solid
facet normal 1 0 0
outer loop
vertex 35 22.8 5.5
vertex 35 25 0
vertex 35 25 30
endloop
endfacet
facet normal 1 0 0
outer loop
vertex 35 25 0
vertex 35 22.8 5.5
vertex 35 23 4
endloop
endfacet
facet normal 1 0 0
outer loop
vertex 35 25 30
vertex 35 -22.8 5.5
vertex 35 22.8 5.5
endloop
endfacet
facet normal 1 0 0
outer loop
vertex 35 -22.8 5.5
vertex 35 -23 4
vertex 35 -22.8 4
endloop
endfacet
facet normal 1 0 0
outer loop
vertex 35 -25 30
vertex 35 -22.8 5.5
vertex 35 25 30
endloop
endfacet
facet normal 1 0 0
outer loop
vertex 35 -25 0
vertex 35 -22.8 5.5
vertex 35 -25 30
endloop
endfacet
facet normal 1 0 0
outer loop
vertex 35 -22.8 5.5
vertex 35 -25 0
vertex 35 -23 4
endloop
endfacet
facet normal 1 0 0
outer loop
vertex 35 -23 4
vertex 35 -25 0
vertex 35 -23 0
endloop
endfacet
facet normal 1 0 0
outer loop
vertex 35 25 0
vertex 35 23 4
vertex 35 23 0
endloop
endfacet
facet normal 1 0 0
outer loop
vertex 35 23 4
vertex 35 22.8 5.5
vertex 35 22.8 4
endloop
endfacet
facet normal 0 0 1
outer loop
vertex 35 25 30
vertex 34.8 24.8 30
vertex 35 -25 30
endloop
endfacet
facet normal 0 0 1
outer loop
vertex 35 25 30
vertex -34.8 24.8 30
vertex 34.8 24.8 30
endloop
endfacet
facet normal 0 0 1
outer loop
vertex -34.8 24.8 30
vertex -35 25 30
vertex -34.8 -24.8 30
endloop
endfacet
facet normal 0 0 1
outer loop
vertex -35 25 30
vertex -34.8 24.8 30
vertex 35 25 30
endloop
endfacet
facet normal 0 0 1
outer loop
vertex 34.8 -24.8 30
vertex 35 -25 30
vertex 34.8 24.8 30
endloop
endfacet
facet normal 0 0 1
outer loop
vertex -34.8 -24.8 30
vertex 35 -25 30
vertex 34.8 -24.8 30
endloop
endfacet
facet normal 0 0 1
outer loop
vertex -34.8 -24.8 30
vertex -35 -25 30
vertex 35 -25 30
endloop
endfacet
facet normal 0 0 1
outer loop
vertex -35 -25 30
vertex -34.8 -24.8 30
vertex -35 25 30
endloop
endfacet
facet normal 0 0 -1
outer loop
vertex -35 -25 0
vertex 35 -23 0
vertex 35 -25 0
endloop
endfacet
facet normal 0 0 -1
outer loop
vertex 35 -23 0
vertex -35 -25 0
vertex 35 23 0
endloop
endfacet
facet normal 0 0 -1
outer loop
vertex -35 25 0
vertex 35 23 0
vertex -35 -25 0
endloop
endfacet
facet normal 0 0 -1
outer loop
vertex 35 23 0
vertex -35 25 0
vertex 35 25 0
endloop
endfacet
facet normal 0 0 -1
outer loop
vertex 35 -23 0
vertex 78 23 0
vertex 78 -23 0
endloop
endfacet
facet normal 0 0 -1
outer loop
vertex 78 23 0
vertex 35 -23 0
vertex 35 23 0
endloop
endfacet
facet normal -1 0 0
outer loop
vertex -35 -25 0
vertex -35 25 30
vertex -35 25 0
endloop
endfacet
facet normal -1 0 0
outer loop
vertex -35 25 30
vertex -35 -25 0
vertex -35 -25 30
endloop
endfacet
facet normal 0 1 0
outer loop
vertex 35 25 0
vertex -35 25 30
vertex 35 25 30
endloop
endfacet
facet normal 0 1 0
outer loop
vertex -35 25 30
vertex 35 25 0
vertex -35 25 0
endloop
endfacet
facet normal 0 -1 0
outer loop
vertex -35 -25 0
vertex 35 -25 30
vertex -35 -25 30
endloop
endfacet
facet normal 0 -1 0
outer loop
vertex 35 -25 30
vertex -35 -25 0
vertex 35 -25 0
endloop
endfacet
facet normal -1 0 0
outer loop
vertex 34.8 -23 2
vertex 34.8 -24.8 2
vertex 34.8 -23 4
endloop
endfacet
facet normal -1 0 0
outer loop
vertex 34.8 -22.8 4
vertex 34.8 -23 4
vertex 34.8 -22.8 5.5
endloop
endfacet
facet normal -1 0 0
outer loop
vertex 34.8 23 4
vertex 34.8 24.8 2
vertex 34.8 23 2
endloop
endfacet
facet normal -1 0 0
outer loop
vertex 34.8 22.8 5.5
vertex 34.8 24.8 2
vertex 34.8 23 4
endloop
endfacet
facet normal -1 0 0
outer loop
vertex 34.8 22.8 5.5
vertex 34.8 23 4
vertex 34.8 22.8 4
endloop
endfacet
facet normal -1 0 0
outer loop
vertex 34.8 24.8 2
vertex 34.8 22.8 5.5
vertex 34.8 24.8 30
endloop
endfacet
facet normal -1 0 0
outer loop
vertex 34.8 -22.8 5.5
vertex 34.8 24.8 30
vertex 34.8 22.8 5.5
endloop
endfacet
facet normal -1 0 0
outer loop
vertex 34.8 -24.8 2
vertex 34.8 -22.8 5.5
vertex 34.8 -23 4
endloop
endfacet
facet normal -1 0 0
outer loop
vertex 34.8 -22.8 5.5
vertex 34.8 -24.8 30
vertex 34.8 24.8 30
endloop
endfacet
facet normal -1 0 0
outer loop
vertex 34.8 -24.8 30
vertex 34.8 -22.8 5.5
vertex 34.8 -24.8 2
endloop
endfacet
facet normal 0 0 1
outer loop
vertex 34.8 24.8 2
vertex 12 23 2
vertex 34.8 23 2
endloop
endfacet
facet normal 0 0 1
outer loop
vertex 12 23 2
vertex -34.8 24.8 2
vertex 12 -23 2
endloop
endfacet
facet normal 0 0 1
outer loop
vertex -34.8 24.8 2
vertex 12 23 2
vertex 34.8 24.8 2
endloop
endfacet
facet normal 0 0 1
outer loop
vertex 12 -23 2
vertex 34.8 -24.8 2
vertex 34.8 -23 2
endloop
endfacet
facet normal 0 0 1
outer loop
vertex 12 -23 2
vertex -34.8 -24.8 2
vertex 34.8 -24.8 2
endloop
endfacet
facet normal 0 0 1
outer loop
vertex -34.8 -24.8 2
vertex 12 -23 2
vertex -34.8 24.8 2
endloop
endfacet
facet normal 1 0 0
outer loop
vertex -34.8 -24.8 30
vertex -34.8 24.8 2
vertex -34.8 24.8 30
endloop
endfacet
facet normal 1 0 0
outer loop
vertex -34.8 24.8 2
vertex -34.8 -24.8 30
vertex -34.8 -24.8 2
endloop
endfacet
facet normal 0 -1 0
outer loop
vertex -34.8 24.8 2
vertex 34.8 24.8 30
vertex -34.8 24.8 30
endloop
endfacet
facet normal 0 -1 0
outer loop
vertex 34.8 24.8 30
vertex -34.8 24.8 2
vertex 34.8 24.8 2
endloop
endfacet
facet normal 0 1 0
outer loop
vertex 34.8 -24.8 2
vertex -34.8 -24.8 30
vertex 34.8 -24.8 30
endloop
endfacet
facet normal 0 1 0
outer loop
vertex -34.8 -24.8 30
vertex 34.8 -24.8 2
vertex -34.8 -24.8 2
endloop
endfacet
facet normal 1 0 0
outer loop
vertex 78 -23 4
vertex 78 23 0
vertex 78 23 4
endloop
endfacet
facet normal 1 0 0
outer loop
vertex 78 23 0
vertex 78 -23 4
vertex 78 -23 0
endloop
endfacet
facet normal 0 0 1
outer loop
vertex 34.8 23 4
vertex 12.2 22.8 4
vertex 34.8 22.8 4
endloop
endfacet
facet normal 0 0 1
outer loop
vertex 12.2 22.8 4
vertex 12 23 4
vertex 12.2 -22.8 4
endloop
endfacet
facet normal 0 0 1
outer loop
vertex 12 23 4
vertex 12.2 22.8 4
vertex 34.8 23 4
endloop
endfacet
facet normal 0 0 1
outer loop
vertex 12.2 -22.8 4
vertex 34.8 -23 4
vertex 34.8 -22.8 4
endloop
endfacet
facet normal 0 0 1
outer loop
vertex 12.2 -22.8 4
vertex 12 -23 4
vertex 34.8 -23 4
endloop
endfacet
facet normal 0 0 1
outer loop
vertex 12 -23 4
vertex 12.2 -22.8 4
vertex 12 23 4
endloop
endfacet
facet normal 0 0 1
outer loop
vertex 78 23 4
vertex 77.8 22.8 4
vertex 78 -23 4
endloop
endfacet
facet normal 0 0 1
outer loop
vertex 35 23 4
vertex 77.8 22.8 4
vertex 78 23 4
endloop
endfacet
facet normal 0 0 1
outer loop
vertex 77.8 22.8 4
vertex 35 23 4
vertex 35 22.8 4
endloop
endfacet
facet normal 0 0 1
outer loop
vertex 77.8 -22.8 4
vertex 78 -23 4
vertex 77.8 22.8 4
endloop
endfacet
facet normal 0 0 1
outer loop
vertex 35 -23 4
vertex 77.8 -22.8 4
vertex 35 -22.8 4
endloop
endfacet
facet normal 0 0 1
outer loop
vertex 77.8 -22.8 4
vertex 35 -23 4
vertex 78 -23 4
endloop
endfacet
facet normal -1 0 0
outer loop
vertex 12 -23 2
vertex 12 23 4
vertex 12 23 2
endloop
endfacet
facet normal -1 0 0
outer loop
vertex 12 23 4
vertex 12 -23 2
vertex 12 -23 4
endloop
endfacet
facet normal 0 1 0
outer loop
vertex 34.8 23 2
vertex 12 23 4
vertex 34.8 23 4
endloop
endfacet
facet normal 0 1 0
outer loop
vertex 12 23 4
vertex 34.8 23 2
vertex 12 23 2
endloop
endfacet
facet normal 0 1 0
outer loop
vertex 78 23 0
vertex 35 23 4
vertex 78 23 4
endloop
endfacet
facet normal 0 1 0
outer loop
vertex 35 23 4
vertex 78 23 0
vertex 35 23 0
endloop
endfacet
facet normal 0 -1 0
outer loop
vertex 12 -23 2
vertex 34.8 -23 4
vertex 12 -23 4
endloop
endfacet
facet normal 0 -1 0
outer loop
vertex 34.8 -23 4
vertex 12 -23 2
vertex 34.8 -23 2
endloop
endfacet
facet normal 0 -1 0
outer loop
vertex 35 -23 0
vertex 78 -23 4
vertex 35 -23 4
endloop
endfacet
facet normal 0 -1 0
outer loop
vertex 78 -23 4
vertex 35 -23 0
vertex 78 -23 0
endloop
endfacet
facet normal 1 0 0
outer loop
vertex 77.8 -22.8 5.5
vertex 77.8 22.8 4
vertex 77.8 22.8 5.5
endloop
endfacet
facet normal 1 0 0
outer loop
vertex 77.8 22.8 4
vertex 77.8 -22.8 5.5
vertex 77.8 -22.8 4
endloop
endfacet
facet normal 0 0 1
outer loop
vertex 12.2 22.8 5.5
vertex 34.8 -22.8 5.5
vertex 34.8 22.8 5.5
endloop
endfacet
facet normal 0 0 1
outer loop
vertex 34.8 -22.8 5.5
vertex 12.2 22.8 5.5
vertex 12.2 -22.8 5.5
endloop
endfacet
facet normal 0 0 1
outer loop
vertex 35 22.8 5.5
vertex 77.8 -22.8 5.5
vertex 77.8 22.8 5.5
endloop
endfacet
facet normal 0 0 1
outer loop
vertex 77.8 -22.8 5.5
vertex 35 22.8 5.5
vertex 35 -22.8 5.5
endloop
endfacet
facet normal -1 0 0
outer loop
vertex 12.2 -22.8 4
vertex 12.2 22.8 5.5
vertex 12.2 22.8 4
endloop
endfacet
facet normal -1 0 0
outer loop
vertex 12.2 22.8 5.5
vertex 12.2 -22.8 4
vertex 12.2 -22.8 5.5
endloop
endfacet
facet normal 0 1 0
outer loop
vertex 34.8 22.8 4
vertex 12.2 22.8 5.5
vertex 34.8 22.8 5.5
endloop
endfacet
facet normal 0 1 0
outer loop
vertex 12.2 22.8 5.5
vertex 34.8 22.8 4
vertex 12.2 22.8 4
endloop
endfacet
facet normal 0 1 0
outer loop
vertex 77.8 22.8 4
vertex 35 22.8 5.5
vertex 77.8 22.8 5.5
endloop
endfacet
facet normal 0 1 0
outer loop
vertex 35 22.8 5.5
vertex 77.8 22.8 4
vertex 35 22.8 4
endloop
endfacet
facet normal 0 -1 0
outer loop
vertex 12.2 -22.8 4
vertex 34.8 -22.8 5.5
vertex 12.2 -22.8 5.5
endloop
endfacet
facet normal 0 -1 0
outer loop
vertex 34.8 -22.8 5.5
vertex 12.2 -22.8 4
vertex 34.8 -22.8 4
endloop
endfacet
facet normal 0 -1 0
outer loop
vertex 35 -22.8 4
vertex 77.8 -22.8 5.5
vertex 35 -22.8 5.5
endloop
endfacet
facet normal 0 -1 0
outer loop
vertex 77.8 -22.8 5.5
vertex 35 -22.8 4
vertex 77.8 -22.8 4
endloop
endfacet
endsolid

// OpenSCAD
// Two-part enclosure for small electronics board (e.g., Arduino-based logger)
// Both parts printed in the same file, side by side on the bed.

// ---------- Parameters ----------
box_x      = 70;    // Box outer size in X (mm)
box_y      = 50;    // Box outer size in Y (mm)
box_z      = 30;    // Box outer size in Z (mm)
wall       = 2;     // Box wall thickness (mm)
floor      = 2;     // Box floor thickness (mm)
open_top   = true;  // Box has an open top

lip_w      = 65.6;  // Lid lip outer size in X (mm)
lip_d      = 45.6;  // Lid lip outer size in Y (mm)
lip_h      = 1.5;   // Lid lip thickness/height (mm)
lip_t      = 4;     // Lid plate thickness (mm)

gap        = 10;    // Gap between box and lid on the bed (mm)
clearance  = 0.2;   // Clearance of lip inside box opening (mm) each side
eps        = 0.5;   // Overcut for clean boolean differences (mm)

$fn = 64;

// ---------- Derived ----------
lip_w2 = lip_w + 2 * clearance;   // Lip outer X including clearance
lip_d2 = lip_d + 2 * clearance;   // Lip outer Y including clearance

// ---------- Modules ----------
module box() {
    difference() {
        translate([-box_x / 2, -box_y / 2, 0])
            cube([box_x, box_y, box_z]);
        if (open_top) {
            translate([-box_x / 2 + clearance, -box_y / 2 + clearance, floor])
                cube([box_x - 2 * clearance,
                      box_y - 2 * clearance,
                      box_z - floor + eps]);
        }
    }
}

module lid() {
    // Lid printed upside down: plate on the bed, lip on top (z = 2 .. 5.5)
    union() {
        translate([-lip_w2 / 2, -lip_d2 / 2, 0])
            cube([lip_w2, lip_d2, lip_t]);
        translate([-lip_w / 2, -lip_d / 2, lip_t - eps])
            cube([lip_w, lip_d, lip_h + eps]);
    }
}

// ---------- Assembly ----------
union() {
    box();
    translate([box_x / 2 + gap, 0, 0])
        lid();
}
